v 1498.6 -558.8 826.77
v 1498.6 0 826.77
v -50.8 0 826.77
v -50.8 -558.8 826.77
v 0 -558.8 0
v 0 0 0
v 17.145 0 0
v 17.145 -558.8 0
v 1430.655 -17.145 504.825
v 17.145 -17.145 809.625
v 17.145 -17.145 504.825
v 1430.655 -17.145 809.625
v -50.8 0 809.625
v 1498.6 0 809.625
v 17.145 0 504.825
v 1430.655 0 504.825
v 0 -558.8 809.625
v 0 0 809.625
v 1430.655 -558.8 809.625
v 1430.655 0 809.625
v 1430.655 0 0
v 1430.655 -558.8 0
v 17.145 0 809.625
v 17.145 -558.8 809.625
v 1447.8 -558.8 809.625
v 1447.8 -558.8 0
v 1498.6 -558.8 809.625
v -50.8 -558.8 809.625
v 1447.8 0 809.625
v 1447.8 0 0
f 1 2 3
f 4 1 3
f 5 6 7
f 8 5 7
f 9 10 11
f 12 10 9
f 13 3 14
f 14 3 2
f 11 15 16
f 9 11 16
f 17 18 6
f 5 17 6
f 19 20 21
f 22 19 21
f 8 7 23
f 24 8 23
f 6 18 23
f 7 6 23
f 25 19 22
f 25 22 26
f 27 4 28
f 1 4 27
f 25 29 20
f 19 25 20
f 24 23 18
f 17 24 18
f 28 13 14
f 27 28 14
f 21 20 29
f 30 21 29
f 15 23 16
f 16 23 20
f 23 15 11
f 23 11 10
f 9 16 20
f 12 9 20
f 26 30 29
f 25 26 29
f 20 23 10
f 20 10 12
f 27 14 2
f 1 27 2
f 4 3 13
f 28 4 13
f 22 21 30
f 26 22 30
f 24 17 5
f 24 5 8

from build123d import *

# Parameters (mm, degrees)
F1_DEPTH = 558.8
F2_DEPTH = 558.8
F3_DEPTH = 558.8
F0_W     = 1413.51
F0_H     = 304.8
F4_DEPTH = 17.145


with BuildPart() as f1:
    # F0 (on Front) → F1 (new body)
    with BuildSketch(Plane.XZ):
        Polygon((0, 809.625), (0, 0), (17.145, 0), (17.145, 504.825), (17.145, 809.625), align=None)
    extrude(amount=F1_DEPTH)


with BuildPart() as f2:
    # F0 (on Front) → F2 (new body)
    with BuildSketch(Plane.XZ):
        Polygon((-50.8, 809.625), (0, 809.625), (17.145, 809.625), (1430.655, 809.625), (1447.8, 809.625), (1498.6, 809.625), (1498.6, 826.77), (-50.8, 826.77), align=None)
    extrude(amount=F2_DEPTH)


with BuildPart() as f3:
    # F0 (on Front) → F3 (new body)
    with BuildSketch(Plane.XZ):
        Polygon((1430.655, 809.625), (1430.655, 504.825), (1430.655, 0), (1447.8, 0), (1447.8, 809.625), align=None)
    extrude(amount=F3_DEPTH)


with BuildPart() as f4:
    # F0 (on Front) → F4 (new body)
    with BuildSketch(Plane.XZ):
        with Locations((723.9, 657.225)):
            Rectangle(F0_W, F0_H)
    extrude(amount=F4_DEPTH)


solid = Compound([f1.part, f2.part, f3.part, f4.part])
